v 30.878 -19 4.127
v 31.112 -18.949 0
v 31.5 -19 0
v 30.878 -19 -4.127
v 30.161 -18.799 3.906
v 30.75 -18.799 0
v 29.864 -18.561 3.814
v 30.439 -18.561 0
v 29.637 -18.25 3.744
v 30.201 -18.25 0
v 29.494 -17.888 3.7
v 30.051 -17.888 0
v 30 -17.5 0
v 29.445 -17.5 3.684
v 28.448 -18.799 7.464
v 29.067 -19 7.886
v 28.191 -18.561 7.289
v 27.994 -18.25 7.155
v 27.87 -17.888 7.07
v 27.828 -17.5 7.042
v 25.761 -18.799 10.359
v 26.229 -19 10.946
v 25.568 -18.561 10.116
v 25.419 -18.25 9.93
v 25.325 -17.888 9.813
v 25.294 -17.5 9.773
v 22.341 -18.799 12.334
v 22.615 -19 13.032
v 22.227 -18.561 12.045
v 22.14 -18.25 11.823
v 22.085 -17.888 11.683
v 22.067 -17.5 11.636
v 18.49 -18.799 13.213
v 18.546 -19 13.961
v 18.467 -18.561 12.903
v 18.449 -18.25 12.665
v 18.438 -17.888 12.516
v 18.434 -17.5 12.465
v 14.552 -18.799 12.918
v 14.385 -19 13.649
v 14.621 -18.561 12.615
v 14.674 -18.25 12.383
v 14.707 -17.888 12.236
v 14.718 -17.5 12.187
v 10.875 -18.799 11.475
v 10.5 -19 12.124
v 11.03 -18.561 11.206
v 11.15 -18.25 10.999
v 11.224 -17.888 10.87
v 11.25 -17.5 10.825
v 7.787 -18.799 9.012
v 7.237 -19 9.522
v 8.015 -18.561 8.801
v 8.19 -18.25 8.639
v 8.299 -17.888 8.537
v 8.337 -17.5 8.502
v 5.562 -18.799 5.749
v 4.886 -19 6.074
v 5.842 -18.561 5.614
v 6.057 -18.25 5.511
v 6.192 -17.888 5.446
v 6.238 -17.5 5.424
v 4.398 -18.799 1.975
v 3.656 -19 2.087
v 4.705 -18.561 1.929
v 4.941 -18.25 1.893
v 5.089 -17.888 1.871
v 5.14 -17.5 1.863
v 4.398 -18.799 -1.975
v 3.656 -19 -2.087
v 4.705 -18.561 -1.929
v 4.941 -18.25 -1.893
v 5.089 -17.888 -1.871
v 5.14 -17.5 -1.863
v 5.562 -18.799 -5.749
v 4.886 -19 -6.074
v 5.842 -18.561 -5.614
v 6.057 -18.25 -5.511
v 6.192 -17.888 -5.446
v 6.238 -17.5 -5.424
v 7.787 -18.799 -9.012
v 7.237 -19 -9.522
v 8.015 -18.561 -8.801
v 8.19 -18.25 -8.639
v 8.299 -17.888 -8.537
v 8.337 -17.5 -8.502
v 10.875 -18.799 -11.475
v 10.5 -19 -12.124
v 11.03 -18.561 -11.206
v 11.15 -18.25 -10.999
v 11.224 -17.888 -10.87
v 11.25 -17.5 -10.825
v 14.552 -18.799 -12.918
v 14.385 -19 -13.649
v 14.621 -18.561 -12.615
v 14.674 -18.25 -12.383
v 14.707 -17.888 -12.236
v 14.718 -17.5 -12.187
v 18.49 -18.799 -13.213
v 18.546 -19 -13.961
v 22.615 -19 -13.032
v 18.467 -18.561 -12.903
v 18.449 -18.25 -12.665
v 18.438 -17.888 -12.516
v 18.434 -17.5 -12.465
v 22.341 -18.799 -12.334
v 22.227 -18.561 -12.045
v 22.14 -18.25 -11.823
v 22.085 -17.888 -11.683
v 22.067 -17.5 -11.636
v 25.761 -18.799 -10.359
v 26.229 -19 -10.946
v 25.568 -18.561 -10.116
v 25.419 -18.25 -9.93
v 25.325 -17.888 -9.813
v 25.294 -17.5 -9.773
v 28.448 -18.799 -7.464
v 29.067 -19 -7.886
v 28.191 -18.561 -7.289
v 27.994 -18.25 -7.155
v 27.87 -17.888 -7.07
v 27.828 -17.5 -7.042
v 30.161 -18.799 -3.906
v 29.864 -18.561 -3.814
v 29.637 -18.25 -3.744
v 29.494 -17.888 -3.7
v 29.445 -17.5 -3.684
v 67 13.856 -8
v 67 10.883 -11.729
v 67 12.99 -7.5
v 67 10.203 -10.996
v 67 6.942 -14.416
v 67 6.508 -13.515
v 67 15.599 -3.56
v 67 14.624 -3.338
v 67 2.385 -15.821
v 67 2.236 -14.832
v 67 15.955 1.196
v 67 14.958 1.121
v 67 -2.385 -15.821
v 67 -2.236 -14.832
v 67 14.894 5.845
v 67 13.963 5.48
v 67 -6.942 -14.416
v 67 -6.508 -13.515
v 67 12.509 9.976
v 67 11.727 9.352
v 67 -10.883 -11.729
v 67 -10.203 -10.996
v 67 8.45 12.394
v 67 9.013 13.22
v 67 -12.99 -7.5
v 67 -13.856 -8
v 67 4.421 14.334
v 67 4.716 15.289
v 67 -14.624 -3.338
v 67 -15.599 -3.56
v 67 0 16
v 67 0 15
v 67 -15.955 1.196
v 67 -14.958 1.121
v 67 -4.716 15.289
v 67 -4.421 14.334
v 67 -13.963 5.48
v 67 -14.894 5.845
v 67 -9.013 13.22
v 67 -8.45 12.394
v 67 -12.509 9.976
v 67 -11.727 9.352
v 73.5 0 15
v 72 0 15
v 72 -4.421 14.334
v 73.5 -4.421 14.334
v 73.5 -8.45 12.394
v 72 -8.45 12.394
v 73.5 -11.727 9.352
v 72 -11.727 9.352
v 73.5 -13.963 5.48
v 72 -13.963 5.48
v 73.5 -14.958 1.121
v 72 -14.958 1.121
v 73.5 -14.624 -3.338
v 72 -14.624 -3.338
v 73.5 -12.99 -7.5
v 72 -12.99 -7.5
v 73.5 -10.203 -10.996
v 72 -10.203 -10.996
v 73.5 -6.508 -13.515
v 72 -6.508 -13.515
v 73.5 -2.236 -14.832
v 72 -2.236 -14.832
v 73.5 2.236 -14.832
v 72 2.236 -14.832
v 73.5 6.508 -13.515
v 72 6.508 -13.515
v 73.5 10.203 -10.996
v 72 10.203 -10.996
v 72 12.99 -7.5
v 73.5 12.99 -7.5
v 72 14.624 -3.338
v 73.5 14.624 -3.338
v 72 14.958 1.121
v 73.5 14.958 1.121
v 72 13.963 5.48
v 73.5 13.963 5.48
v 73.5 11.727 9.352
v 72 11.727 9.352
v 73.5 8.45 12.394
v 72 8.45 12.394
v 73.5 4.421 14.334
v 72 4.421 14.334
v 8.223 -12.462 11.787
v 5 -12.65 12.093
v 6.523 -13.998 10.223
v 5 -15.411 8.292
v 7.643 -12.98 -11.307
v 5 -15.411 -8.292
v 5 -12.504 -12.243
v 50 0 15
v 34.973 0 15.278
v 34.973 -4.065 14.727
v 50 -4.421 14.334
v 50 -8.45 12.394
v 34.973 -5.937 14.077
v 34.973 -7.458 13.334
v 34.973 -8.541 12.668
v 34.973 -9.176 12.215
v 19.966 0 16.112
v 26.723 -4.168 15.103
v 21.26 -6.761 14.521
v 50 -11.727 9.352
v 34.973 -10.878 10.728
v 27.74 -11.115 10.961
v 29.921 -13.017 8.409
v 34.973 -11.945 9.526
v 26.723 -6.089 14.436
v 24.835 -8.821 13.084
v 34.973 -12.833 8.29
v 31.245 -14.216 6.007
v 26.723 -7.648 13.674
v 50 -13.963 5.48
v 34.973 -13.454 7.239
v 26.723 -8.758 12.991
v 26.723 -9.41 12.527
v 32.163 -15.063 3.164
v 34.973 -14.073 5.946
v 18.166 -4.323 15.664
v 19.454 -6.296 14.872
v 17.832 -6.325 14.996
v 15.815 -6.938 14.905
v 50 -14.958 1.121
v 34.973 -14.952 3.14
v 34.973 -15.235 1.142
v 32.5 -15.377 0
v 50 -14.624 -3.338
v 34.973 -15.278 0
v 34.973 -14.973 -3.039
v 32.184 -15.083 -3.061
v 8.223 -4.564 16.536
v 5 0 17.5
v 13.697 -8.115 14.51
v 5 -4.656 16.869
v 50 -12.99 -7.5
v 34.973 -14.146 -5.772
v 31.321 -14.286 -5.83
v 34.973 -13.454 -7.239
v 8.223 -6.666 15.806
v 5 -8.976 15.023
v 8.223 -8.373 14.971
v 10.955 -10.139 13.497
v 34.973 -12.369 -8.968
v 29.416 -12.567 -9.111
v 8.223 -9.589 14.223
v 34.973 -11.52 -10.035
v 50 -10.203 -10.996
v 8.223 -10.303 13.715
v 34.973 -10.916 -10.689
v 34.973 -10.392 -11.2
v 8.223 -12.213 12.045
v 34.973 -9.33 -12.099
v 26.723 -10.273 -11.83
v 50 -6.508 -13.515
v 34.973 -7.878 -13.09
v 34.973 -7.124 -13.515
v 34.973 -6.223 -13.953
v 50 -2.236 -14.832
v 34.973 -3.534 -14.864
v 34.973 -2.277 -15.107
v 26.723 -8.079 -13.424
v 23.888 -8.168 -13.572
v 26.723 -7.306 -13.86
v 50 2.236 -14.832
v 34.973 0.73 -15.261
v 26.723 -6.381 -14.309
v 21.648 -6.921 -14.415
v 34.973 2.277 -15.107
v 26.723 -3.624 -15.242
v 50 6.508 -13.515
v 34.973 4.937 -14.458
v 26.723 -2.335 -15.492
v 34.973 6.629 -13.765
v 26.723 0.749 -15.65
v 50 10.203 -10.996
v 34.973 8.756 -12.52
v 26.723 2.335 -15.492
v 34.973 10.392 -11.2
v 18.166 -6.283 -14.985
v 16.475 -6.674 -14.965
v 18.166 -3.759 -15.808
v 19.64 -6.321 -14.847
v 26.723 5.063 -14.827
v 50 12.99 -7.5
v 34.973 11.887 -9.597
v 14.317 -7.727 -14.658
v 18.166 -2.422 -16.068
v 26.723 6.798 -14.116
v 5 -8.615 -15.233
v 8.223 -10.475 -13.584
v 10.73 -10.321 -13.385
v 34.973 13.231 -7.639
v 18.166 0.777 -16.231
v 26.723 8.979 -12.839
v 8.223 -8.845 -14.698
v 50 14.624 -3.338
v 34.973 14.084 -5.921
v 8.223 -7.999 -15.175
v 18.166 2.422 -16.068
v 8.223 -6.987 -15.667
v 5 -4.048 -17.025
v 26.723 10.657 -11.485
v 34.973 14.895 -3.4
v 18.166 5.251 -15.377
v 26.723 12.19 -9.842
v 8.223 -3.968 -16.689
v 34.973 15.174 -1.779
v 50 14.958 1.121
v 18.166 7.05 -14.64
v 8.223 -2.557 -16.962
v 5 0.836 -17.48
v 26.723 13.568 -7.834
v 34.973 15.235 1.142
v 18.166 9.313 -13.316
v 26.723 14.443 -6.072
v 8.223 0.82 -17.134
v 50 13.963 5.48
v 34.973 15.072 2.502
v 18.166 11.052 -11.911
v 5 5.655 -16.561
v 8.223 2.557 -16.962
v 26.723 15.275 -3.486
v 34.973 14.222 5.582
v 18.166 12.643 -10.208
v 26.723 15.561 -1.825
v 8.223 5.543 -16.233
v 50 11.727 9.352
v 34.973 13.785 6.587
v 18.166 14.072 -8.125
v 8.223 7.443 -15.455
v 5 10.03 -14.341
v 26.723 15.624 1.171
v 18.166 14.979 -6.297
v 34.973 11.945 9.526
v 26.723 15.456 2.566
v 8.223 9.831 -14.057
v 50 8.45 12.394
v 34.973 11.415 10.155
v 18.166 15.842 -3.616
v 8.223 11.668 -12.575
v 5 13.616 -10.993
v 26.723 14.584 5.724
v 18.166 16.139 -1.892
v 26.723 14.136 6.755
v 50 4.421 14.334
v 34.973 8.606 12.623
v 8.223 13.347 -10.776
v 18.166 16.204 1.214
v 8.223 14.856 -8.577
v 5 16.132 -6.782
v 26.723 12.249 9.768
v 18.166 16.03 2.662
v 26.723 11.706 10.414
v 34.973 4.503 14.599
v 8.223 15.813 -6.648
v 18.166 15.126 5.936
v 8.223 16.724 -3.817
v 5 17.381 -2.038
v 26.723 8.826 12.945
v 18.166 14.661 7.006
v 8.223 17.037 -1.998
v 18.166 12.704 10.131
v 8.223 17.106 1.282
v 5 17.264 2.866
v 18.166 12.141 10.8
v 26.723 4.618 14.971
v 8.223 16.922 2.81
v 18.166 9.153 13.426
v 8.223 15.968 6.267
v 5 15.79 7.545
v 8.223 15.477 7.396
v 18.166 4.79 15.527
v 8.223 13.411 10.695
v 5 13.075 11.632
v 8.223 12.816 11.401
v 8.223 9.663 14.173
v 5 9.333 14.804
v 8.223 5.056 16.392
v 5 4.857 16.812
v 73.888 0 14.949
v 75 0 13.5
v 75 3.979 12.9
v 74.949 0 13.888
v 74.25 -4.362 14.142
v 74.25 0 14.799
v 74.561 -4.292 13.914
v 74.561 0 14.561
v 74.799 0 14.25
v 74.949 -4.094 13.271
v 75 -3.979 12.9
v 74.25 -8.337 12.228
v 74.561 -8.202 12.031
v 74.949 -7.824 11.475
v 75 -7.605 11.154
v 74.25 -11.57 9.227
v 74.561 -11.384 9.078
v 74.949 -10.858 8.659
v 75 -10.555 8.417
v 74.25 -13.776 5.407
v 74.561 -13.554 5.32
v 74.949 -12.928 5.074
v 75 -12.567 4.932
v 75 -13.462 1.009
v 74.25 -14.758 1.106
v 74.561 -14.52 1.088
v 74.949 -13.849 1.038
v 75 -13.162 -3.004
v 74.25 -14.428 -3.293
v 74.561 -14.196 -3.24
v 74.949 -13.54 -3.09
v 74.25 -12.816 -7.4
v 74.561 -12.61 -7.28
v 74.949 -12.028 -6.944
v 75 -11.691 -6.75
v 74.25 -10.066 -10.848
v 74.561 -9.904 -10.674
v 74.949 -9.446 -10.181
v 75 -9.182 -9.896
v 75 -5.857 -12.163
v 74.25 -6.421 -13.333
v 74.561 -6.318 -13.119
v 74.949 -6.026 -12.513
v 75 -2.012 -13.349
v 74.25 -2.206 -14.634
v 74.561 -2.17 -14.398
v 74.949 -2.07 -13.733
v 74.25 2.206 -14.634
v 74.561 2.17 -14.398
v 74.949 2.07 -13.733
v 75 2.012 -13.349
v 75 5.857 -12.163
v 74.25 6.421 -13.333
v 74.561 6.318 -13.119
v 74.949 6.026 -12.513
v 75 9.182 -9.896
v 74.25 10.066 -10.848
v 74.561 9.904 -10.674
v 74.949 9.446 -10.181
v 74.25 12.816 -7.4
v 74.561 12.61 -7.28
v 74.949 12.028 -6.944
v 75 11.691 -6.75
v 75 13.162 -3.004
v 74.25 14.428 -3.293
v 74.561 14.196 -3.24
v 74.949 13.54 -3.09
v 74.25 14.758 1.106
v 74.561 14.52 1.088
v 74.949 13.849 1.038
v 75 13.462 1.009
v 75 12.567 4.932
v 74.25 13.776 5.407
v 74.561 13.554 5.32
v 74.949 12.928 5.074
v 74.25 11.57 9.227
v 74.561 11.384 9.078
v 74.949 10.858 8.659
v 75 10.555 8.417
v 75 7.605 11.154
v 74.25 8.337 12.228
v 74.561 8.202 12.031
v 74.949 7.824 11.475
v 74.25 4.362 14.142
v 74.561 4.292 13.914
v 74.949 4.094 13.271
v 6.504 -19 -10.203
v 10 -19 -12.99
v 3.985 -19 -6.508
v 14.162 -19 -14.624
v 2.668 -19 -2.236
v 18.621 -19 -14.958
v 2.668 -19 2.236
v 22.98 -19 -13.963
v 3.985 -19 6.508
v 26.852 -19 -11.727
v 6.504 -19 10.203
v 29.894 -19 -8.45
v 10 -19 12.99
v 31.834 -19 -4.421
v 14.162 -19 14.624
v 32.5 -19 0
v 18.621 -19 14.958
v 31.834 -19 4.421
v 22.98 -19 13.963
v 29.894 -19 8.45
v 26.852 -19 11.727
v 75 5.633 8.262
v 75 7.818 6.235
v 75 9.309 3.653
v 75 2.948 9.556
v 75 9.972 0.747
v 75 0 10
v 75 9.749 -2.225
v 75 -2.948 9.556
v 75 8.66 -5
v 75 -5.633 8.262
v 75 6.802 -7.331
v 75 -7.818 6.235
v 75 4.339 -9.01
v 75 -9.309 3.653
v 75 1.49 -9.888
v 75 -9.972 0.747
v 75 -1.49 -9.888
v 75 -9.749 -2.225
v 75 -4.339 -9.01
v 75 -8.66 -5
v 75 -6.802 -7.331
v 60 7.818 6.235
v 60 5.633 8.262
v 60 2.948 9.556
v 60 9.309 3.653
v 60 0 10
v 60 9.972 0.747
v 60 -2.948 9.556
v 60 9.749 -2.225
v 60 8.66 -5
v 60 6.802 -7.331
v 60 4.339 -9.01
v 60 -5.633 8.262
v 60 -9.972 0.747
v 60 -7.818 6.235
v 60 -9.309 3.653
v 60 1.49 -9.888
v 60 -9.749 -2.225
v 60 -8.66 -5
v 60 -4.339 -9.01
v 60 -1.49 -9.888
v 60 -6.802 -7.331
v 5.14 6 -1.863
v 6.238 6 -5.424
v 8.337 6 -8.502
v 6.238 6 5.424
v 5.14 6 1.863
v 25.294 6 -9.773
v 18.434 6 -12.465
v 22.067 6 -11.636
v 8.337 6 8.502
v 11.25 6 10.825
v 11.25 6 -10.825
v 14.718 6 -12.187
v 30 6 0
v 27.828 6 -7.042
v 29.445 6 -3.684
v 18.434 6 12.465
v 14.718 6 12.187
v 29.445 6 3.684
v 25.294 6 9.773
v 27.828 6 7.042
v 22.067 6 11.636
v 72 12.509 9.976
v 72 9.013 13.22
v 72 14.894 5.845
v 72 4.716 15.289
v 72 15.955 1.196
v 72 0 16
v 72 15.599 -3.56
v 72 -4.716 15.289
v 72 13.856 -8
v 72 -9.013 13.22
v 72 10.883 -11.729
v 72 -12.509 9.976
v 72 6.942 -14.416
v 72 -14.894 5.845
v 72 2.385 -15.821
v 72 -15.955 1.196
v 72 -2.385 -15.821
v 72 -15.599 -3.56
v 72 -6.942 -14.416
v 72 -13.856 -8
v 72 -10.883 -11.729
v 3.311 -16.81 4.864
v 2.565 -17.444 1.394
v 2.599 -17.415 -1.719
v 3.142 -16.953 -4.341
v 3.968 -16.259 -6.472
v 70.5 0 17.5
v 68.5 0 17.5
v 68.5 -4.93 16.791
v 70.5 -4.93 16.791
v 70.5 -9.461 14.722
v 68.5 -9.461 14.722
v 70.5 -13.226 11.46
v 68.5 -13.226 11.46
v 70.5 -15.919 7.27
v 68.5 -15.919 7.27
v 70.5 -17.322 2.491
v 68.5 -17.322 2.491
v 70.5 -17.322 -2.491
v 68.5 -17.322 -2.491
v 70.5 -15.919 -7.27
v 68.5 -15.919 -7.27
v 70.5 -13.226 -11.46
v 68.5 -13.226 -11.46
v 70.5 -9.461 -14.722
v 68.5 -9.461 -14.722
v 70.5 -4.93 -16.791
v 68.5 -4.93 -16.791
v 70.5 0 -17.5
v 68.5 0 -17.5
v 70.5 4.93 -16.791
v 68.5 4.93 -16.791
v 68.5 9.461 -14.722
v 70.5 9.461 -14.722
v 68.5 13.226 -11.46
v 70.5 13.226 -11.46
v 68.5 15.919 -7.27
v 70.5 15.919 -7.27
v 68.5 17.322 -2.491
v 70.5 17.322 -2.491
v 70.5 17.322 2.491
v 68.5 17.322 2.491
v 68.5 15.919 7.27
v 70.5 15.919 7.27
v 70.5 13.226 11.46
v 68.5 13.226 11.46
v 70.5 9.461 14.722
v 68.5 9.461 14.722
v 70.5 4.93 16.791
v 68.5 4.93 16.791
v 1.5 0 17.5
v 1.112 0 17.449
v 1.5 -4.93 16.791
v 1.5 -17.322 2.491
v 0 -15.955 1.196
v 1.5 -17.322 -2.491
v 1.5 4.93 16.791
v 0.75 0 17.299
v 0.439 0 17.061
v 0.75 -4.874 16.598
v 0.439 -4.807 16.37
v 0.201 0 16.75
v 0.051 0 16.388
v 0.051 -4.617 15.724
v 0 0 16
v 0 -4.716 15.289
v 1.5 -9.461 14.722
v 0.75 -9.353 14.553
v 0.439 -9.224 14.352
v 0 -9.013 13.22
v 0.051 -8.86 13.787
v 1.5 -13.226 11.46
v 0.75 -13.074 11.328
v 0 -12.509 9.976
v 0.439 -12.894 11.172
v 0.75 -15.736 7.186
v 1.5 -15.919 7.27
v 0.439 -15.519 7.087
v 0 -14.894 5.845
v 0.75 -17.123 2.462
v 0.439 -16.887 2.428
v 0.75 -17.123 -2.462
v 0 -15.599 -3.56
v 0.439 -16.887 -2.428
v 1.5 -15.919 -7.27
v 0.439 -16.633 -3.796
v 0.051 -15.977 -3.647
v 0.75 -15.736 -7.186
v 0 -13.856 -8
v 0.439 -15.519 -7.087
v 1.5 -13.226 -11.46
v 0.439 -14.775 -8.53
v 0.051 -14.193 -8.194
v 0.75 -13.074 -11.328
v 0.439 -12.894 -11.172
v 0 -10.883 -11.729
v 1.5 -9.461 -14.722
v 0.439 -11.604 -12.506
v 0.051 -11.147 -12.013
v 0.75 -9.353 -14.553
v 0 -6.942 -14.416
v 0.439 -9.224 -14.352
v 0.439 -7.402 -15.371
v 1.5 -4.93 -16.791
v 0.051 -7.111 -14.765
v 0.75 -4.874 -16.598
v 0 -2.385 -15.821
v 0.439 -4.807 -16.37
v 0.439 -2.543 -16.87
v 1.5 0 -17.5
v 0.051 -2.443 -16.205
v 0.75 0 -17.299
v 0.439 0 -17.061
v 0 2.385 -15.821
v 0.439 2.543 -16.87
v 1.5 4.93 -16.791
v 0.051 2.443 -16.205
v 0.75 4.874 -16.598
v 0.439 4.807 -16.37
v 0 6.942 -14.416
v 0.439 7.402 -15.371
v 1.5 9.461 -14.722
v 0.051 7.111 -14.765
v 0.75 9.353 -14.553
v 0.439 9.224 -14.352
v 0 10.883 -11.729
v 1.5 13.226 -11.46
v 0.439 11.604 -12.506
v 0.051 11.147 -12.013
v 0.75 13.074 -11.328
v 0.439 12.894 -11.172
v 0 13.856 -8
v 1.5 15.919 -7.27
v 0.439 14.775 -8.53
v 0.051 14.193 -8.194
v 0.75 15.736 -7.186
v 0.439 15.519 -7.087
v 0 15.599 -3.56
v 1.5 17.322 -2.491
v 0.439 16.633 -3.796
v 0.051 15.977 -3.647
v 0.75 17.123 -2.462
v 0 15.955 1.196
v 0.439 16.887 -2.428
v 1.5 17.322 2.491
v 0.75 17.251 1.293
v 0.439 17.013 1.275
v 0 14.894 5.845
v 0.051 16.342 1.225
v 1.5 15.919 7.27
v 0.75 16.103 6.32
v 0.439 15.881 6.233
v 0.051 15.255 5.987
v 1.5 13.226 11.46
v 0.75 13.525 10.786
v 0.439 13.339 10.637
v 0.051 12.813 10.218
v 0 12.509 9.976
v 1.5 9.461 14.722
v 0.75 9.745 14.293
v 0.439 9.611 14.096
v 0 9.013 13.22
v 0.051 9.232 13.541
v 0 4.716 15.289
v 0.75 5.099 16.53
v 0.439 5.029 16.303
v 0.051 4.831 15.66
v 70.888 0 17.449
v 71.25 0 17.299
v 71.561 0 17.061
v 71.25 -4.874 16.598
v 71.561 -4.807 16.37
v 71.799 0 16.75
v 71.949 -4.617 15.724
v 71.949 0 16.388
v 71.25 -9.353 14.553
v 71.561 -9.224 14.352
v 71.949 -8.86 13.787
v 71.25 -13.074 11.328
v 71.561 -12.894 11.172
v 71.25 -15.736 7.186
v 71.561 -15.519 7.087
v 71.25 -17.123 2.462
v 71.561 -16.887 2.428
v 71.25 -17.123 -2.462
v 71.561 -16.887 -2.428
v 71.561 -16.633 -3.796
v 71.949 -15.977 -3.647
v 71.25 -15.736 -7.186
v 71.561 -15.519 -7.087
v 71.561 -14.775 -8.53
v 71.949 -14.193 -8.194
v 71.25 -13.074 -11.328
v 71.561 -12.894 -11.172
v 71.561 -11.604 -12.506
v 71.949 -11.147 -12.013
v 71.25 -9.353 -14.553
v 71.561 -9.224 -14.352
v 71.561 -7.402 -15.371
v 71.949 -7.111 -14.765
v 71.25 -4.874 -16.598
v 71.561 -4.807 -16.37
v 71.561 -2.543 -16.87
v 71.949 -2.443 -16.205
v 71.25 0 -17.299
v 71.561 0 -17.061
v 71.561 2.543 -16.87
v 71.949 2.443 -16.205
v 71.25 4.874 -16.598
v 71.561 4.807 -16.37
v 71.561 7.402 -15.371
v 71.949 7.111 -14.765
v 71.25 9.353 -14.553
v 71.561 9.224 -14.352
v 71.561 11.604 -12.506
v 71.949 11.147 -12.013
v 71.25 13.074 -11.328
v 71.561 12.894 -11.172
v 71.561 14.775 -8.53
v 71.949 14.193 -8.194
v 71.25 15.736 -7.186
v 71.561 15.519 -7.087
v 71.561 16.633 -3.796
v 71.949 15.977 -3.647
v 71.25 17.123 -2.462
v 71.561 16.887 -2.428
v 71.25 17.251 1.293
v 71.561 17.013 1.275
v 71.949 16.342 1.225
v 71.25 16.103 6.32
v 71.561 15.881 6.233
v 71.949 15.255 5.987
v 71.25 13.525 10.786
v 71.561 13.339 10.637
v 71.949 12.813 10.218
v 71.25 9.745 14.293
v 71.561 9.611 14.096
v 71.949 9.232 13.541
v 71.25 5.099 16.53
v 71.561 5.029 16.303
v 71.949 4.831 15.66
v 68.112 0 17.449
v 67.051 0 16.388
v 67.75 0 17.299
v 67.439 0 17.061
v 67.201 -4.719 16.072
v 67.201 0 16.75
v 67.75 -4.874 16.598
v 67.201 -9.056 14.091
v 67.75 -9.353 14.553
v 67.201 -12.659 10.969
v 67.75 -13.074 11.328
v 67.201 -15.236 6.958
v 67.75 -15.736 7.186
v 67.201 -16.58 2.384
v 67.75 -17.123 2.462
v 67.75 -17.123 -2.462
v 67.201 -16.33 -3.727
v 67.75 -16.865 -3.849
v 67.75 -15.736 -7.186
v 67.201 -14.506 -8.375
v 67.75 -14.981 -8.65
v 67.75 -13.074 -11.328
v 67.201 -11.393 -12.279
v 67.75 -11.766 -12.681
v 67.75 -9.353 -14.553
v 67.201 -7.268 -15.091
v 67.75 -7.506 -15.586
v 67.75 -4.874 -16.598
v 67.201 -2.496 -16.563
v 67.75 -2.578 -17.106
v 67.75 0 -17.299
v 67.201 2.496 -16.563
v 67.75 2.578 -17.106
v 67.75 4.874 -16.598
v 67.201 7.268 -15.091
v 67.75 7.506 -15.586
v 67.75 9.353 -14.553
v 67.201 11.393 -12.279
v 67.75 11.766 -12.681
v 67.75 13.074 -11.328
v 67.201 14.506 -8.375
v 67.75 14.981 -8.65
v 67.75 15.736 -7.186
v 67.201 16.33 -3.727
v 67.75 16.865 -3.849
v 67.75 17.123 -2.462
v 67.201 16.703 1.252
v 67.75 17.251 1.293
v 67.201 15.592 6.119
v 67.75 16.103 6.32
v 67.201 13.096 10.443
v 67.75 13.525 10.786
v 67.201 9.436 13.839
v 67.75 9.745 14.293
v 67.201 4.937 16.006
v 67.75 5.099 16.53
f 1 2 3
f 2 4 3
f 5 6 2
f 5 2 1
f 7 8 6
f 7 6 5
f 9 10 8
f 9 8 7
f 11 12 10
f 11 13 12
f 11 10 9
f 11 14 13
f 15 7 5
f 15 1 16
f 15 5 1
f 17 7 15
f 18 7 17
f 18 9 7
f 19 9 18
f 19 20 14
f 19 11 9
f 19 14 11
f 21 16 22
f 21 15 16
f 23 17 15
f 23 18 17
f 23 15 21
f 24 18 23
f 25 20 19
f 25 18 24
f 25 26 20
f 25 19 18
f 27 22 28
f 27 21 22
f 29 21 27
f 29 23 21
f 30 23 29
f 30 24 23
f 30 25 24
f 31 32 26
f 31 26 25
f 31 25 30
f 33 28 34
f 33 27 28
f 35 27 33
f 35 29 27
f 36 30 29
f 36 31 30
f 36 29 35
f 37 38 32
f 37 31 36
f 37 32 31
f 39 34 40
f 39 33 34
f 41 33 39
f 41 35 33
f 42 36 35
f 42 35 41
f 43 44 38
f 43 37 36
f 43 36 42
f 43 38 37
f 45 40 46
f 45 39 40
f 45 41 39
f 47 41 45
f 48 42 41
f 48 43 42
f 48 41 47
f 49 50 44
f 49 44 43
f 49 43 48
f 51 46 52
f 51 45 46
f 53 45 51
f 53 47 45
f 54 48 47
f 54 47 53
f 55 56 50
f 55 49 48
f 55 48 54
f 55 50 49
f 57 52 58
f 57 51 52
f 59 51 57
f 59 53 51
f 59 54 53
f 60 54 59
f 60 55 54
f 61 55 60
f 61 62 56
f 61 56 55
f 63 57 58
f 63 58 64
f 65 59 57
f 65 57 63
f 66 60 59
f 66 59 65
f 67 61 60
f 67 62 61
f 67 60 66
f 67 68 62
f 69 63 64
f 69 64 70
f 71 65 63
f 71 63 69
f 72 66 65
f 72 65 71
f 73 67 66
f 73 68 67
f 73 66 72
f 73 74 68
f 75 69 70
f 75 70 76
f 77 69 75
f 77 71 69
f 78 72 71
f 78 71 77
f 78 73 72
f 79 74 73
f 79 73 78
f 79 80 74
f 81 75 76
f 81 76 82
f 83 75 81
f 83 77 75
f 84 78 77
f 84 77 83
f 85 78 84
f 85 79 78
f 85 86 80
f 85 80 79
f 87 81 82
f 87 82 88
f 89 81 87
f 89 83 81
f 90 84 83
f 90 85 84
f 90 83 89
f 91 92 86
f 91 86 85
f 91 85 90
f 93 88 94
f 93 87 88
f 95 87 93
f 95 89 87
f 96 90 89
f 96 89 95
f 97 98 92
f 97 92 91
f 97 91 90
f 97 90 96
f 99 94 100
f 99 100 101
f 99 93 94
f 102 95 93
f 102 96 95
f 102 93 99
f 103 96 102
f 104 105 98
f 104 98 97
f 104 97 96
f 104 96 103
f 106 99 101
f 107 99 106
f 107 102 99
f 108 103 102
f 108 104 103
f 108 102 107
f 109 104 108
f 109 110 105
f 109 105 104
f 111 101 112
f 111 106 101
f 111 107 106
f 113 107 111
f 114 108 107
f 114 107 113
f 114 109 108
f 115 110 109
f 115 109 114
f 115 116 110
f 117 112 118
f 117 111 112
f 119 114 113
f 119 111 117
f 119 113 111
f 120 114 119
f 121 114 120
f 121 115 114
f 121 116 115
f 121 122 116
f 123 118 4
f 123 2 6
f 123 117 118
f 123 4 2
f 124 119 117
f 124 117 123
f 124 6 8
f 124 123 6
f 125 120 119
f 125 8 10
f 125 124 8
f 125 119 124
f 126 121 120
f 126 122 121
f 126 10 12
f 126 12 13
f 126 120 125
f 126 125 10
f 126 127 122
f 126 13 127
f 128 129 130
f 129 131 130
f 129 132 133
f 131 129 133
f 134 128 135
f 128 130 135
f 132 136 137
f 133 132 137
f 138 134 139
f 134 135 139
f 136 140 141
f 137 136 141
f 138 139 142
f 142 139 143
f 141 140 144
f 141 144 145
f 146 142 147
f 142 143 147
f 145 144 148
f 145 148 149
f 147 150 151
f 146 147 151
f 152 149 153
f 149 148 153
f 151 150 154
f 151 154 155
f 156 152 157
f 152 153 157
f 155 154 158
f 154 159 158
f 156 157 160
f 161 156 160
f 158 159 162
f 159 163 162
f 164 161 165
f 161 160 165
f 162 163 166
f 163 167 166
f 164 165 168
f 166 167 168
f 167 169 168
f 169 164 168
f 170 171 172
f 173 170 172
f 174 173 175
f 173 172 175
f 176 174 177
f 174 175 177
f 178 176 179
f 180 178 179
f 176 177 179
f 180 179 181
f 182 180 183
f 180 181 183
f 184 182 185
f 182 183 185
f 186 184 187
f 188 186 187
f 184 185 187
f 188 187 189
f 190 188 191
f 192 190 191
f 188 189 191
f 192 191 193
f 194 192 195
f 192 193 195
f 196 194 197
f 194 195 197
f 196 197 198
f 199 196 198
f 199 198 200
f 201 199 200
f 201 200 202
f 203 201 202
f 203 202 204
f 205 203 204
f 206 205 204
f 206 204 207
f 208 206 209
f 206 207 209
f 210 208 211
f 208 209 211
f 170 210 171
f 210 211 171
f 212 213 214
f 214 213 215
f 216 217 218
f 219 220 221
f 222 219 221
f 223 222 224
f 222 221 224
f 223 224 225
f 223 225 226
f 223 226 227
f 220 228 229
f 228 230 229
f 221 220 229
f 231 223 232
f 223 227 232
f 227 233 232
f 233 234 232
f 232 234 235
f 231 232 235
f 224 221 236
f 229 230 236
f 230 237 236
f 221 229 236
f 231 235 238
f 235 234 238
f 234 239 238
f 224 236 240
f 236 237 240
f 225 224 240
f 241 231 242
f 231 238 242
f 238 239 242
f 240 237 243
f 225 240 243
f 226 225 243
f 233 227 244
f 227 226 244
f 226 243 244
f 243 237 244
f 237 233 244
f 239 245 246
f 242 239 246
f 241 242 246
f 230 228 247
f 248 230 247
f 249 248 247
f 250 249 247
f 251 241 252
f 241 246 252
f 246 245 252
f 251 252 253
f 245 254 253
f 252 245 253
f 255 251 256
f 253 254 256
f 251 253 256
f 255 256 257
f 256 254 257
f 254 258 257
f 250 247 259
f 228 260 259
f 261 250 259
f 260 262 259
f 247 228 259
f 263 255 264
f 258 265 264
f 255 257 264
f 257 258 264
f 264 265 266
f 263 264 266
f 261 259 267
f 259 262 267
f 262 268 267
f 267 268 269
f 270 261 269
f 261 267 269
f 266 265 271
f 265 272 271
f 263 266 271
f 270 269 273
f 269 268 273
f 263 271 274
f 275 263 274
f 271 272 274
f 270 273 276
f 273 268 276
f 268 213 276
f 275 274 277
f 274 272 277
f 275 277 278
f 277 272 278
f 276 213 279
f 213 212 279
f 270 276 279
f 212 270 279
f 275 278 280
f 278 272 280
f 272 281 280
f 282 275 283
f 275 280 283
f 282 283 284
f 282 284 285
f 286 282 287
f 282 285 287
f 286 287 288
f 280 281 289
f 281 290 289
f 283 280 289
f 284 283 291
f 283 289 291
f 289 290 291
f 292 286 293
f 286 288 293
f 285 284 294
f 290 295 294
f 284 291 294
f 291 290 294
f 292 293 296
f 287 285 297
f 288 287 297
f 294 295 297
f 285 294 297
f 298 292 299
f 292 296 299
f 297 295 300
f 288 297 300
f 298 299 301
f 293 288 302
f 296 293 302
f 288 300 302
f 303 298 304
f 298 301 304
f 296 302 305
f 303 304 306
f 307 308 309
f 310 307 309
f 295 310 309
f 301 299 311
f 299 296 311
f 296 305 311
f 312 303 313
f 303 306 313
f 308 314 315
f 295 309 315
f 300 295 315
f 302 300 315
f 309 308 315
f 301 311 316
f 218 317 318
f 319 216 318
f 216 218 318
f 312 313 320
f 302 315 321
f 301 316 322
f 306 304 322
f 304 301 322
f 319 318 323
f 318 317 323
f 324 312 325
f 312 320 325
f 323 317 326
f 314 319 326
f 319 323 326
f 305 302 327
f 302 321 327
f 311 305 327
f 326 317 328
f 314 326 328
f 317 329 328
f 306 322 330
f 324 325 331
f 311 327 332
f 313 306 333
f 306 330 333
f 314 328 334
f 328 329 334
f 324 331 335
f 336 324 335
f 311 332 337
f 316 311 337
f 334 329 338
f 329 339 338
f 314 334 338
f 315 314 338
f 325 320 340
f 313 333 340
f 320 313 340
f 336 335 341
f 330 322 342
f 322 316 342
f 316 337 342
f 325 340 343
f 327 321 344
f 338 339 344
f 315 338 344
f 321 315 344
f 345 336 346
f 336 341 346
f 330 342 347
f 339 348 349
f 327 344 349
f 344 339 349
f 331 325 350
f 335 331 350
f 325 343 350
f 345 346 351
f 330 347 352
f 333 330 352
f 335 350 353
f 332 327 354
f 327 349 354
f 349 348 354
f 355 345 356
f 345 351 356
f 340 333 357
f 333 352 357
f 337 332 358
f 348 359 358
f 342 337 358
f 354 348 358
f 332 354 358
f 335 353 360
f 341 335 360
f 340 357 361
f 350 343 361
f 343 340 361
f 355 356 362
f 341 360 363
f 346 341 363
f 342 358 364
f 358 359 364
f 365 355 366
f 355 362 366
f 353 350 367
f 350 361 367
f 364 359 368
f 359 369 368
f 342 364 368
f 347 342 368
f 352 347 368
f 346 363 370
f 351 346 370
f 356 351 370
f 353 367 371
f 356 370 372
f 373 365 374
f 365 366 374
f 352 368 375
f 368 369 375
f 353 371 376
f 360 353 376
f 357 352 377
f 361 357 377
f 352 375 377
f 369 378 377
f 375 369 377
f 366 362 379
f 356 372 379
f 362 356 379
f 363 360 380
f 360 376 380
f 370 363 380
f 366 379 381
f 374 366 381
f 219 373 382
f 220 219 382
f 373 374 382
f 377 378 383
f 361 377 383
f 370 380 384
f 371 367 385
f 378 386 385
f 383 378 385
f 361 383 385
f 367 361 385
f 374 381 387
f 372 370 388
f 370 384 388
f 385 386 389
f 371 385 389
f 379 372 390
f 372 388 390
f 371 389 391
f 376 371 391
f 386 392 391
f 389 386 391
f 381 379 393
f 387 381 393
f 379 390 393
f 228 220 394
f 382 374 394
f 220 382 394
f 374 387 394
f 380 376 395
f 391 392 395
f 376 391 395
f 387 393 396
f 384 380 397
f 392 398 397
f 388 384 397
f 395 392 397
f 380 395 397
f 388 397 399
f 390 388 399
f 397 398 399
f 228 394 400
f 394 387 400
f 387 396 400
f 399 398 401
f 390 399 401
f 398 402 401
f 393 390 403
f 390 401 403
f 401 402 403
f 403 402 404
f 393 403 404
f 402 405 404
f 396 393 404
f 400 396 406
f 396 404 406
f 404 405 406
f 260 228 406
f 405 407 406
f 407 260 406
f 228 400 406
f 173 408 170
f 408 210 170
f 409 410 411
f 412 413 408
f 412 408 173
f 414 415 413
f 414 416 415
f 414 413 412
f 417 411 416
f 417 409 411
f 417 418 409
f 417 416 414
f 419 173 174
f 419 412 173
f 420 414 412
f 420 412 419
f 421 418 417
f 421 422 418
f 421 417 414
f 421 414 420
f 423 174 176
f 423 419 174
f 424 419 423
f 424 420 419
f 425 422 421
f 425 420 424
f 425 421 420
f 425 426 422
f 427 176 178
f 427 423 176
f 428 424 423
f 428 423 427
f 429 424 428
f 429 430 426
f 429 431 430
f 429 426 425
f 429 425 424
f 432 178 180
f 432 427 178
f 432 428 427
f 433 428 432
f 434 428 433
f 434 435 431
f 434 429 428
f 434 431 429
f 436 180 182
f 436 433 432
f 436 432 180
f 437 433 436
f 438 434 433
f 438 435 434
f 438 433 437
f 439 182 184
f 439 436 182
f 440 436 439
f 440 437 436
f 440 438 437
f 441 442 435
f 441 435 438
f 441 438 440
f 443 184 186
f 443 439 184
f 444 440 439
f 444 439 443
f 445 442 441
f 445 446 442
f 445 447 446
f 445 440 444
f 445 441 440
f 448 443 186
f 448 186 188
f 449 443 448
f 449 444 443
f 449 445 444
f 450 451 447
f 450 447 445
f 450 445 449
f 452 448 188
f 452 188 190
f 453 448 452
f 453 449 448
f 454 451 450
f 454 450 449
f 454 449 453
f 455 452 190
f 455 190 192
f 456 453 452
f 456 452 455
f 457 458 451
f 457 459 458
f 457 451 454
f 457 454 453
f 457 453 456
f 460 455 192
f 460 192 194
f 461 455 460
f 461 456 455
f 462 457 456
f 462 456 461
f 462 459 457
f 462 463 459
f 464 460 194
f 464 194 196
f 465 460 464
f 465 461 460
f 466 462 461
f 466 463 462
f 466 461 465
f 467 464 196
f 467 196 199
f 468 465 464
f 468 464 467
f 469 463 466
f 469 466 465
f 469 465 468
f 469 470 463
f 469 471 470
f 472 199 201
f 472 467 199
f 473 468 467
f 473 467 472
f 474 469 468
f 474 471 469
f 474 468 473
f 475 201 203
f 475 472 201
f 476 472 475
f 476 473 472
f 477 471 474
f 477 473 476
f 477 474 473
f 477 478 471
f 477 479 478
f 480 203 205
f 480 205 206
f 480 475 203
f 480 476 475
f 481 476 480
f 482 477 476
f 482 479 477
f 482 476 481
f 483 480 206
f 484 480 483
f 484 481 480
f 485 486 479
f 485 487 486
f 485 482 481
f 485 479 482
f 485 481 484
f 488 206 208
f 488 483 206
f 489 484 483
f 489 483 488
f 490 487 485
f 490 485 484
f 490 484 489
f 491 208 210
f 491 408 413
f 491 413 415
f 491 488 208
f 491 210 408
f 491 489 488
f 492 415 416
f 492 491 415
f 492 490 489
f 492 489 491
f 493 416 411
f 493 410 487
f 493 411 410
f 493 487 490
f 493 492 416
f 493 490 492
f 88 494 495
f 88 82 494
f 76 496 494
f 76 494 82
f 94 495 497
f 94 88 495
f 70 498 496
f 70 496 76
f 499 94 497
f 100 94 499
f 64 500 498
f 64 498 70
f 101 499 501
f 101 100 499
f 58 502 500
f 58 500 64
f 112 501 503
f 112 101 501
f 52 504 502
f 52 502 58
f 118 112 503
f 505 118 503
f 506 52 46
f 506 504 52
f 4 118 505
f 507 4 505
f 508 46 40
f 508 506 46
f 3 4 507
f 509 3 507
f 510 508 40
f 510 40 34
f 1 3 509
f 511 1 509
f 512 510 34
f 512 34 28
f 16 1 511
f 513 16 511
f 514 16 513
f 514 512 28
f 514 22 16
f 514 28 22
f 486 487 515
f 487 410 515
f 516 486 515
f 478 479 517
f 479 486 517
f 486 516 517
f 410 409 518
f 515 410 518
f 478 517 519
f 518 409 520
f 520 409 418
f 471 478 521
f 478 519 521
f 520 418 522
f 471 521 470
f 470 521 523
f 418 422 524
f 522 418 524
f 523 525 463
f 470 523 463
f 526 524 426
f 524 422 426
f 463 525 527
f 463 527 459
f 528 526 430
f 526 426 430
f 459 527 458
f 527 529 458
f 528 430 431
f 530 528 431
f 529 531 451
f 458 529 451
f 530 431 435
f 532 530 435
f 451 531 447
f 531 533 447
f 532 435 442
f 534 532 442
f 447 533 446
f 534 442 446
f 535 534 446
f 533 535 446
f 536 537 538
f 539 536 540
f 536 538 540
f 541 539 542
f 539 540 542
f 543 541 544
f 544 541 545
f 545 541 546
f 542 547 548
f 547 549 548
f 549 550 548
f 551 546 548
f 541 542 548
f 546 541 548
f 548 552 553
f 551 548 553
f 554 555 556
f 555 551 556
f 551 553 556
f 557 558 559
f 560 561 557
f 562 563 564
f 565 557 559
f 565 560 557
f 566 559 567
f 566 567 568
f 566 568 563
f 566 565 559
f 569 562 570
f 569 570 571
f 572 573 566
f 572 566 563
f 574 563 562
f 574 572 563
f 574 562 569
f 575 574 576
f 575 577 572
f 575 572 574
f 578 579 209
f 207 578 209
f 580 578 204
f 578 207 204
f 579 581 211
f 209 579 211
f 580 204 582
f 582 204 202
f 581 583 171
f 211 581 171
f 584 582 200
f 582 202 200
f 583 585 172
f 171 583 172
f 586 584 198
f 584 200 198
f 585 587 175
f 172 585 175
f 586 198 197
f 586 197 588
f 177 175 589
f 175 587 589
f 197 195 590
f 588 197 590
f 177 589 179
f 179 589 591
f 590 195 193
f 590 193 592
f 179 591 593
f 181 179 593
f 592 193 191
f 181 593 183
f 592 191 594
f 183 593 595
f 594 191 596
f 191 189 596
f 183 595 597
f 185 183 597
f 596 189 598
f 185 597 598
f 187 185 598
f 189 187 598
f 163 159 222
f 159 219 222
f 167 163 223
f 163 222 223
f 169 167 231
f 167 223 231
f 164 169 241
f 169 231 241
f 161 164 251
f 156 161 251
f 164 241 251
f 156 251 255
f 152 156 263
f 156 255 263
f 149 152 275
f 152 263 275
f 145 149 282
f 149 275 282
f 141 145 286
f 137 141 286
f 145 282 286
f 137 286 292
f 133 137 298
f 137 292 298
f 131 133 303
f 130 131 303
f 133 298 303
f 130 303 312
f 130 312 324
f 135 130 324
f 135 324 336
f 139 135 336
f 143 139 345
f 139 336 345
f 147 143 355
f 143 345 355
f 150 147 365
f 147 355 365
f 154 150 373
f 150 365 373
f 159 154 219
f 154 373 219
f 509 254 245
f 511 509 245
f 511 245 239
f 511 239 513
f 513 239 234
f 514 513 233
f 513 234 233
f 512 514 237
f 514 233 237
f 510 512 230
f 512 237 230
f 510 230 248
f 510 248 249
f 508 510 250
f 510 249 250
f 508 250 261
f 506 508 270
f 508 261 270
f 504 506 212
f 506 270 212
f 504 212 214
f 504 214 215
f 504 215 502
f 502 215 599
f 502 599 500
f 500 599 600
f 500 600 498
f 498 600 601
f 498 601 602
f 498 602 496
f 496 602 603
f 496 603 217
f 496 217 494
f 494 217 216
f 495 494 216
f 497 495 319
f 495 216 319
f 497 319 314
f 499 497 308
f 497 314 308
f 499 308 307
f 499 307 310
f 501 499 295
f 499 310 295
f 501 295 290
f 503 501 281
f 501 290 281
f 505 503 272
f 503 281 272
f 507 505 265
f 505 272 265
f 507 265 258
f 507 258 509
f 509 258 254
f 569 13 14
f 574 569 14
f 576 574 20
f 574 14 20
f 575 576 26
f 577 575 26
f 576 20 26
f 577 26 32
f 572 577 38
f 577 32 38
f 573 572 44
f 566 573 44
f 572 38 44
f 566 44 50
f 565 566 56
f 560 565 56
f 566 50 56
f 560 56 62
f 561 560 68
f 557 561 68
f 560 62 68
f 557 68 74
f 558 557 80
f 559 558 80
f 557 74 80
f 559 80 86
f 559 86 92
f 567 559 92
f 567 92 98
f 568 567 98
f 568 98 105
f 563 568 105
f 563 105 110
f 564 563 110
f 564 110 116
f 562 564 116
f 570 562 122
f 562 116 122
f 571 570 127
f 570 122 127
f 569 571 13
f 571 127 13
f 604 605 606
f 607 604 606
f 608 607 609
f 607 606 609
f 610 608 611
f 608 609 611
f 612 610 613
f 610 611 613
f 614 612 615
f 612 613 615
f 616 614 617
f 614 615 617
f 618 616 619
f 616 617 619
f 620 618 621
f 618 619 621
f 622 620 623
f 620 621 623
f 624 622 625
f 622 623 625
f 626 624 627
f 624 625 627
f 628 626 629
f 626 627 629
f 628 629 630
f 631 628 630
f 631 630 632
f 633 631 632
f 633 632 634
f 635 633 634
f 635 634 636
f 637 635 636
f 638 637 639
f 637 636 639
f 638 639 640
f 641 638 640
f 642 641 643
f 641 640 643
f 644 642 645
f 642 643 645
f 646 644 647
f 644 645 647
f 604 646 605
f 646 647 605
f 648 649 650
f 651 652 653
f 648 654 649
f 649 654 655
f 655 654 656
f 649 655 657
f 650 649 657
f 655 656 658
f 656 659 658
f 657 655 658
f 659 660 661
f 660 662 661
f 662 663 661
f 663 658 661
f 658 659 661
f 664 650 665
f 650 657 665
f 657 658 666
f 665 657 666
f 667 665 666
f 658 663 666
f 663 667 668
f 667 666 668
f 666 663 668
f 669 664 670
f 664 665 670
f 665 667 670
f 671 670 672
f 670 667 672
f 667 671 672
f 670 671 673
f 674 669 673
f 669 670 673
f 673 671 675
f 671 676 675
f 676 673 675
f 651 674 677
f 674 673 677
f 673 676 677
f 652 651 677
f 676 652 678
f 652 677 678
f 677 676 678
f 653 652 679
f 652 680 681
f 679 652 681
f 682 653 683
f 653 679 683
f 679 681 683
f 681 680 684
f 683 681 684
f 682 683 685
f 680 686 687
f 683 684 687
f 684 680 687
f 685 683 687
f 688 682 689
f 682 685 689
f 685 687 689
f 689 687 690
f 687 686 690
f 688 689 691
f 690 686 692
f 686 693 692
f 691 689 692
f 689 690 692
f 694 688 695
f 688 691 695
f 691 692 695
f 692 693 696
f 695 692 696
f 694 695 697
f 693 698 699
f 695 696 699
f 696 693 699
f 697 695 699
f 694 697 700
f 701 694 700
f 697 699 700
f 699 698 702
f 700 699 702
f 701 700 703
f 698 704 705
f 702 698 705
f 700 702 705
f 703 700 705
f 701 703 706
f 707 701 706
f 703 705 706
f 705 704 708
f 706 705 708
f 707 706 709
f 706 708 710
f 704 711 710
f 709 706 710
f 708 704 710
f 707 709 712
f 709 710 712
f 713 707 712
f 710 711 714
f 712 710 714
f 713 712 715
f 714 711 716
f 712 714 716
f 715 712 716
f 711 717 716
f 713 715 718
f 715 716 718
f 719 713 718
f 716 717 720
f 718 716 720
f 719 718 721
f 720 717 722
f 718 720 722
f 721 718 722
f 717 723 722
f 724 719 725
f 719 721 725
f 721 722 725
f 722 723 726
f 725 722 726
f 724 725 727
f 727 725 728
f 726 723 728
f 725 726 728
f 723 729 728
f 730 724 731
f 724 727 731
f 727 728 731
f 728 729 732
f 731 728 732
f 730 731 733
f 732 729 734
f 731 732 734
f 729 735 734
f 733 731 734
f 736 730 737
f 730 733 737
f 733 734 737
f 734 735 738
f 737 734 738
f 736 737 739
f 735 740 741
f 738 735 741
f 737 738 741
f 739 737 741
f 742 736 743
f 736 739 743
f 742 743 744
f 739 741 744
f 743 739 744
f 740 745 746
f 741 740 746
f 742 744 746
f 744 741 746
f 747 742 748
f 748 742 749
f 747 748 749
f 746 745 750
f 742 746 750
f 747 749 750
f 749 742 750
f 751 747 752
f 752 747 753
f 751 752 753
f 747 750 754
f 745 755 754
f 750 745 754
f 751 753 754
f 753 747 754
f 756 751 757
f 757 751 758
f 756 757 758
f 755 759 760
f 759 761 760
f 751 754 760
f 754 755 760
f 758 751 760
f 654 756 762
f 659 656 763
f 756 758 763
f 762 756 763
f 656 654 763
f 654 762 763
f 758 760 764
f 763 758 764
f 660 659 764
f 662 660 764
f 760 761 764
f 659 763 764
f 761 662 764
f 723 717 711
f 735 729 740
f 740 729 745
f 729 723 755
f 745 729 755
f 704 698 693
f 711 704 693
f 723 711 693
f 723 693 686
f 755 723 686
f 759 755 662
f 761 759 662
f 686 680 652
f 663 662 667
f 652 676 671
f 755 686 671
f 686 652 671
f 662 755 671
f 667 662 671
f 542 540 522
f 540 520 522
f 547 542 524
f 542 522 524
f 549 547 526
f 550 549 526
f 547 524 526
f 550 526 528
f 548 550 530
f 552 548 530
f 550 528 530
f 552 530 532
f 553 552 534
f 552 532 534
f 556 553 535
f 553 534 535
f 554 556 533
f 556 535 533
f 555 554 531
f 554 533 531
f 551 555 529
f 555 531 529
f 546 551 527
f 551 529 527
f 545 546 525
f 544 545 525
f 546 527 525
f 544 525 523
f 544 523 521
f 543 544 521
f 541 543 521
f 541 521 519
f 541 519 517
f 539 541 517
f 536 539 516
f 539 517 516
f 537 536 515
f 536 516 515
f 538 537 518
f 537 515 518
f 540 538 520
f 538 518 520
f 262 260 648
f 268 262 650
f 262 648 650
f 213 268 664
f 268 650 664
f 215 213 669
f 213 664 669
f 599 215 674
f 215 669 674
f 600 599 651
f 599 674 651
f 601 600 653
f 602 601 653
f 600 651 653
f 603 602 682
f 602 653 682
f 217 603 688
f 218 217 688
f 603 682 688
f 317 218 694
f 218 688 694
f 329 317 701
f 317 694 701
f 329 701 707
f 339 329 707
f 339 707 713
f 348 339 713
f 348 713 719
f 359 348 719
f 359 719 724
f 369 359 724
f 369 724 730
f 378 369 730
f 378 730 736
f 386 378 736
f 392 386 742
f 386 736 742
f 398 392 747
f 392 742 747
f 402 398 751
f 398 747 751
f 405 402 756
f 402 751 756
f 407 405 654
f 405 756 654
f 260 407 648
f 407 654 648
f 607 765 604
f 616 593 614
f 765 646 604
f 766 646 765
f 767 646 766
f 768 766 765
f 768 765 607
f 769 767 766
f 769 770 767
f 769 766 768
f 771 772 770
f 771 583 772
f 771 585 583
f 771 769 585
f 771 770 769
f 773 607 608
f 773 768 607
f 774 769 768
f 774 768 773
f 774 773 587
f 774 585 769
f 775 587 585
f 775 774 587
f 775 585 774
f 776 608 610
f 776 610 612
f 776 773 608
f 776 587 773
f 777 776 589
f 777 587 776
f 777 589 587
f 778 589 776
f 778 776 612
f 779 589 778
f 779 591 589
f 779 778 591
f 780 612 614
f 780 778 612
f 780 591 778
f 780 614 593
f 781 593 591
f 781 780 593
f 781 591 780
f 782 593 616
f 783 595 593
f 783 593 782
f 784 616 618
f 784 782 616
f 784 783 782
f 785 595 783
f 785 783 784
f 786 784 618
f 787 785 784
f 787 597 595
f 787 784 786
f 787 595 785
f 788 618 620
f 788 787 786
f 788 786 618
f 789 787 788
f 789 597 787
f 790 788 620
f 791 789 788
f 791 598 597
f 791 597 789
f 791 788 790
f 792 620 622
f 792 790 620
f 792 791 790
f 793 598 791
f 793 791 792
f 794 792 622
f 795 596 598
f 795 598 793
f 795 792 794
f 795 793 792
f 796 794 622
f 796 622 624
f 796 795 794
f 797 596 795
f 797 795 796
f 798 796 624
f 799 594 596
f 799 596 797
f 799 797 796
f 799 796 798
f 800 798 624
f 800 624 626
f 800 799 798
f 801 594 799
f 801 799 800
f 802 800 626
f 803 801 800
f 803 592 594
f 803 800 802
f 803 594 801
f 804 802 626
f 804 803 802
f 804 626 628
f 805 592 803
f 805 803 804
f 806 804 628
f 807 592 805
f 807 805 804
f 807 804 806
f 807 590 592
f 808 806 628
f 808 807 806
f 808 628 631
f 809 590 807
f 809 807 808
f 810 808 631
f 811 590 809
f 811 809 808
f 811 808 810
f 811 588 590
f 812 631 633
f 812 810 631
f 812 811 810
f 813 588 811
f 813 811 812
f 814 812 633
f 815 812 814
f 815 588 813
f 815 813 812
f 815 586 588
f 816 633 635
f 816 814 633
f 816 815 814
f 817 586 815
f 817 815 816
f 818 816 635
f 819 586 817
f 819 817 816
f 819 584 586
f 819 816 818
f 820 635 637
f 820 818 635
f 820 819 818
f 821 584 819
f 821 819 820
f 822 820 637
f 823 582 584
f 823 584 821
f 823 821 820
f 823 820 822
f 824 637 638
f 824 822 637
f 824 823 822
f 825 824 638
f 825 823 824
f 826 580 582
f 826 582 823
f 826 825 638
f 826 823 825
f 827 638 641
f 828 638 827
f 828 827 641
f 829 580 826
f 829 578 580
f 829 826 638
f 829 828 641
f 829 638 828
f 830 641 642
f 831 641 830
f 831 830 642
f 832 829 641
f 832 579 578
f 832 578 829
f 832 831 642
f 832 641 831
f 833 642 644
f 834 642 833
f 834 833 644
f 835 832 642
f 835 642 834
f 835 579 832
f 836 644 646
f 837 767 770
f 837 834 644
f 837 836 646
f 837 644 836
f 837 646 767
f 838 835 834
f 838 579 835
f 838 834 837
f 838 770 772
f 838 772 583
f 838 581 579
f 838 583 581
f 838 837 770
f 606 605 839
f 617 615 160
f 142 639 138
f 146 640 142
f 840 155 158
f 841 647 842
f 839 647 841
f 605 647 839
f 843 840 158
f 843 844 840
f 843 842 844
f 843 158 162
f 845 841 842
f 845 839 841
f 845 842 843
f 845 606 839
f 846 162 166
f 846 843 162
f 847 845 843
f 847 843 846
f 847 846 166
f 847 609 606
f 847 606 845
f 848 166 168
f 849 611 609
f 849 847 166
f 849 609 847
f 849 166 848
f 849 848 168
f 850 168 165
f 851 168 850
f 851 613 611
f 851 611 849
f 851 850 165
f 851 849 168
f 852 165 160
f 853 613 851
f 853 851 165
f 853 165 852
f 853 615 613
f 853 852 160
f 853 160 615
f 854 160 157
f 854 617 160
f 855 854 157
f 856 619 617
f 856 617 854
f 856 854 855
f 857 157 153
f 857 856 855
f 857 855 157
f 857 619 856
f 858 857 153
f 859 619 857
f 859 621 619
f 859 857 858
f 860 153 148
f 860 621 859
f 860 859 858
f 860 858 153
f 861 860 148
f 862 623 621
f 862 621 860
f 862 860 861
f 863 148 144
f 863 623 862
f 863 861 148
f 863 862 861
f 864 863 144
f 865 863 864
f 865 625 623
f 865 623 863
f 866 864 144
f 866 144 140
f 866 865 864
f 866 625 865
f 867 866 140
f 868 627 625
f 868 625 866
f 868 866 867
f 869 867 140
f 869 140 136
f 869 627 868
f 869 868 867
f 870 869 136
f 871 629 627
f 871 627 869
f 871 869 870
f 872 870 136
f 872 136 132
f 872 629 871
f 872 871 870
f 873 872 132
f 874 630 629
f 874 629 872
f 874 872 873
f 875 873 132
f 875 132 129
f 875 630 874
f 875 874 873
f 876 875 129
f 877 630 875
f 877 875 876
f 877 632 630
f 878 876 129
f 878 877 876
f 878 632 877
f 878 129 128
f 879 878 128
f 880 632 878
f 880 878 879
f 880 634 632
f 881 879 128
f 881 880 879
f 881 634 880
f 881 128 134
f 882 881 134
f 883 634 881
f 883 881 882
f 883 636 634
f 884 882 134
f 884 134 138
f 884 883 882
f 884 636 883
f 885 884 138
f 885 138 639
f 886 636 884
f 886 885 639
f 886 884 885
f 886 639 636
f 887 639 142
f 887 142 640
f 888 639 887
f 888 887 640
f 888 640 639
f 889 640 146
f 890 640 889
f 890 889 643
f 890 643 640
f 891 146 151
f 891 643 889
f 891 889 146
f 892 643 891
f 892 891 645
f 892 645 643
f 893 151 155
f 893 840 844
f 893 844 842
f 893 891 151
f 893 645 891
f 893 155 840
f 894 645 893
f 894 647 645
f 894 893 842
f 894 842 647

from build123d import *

# Parameters (mm, degrees)
F2_R     = 15
F3_DEPTH = 19
F4_R     = 12.5
F5_DEPTH = 25
F6_R     = 1.5


with BuildPart() as f1:
    # F0 (on Front) → F1 (revolve)
    with BuildSketch(Plane.XZ):
        with BuildLine():
            Line((0, 17.5), (0, 0))
            Line((0, 0), (60, 0))
            Line((60, 0), (60, 10))
            Line((60, 10), (75, 10))
            Line((75, 10), (75, 15))
            Line((75, 15), (72, 15))
            Line((72, 15), (72, 17.5))
            Line((72, 17.5), (67, 17.5))
            Line((67, 17.5), (67, 15))
            Line((67, 15), (50, 15))
            ThreePointArc((50, 15), (27.465305, 15.625482), (5, 17.5))
            Line((5, 17.5), (0, 17.5))
        make_face()
    revolve(axis=Axis((30, 0, 0), (1, 0, 0)))

    # F2 (on Front) → F3 (join)
    with BuildSketch(Plane.XZ):
        with Locations((17.5, 0)):
            Circle(F2_R)
    extrude(amount=F3_DEPTH)

    # F4 (on face) → F5 (cut)
    with BuildSketch(Plane.XZ.offset(19)):
        with Locations((17.5, 0)):
            Circle(F4_R)
    extrude(amount=-F5_DEPTH, mode=Mode.SUBTRACT)

    # F6
    f6_edges = [f1.edges().sort_by_distance(p)[0] for p in [
        (0, 0, -17.5),
        (5, -19, 0),
        (75, 0, -15),
        (72, 0, -17.5),
        (67, 0, -17.5),
    ]]
    fillet(f6_edges, radius=F6_R)


solid = f1.part
